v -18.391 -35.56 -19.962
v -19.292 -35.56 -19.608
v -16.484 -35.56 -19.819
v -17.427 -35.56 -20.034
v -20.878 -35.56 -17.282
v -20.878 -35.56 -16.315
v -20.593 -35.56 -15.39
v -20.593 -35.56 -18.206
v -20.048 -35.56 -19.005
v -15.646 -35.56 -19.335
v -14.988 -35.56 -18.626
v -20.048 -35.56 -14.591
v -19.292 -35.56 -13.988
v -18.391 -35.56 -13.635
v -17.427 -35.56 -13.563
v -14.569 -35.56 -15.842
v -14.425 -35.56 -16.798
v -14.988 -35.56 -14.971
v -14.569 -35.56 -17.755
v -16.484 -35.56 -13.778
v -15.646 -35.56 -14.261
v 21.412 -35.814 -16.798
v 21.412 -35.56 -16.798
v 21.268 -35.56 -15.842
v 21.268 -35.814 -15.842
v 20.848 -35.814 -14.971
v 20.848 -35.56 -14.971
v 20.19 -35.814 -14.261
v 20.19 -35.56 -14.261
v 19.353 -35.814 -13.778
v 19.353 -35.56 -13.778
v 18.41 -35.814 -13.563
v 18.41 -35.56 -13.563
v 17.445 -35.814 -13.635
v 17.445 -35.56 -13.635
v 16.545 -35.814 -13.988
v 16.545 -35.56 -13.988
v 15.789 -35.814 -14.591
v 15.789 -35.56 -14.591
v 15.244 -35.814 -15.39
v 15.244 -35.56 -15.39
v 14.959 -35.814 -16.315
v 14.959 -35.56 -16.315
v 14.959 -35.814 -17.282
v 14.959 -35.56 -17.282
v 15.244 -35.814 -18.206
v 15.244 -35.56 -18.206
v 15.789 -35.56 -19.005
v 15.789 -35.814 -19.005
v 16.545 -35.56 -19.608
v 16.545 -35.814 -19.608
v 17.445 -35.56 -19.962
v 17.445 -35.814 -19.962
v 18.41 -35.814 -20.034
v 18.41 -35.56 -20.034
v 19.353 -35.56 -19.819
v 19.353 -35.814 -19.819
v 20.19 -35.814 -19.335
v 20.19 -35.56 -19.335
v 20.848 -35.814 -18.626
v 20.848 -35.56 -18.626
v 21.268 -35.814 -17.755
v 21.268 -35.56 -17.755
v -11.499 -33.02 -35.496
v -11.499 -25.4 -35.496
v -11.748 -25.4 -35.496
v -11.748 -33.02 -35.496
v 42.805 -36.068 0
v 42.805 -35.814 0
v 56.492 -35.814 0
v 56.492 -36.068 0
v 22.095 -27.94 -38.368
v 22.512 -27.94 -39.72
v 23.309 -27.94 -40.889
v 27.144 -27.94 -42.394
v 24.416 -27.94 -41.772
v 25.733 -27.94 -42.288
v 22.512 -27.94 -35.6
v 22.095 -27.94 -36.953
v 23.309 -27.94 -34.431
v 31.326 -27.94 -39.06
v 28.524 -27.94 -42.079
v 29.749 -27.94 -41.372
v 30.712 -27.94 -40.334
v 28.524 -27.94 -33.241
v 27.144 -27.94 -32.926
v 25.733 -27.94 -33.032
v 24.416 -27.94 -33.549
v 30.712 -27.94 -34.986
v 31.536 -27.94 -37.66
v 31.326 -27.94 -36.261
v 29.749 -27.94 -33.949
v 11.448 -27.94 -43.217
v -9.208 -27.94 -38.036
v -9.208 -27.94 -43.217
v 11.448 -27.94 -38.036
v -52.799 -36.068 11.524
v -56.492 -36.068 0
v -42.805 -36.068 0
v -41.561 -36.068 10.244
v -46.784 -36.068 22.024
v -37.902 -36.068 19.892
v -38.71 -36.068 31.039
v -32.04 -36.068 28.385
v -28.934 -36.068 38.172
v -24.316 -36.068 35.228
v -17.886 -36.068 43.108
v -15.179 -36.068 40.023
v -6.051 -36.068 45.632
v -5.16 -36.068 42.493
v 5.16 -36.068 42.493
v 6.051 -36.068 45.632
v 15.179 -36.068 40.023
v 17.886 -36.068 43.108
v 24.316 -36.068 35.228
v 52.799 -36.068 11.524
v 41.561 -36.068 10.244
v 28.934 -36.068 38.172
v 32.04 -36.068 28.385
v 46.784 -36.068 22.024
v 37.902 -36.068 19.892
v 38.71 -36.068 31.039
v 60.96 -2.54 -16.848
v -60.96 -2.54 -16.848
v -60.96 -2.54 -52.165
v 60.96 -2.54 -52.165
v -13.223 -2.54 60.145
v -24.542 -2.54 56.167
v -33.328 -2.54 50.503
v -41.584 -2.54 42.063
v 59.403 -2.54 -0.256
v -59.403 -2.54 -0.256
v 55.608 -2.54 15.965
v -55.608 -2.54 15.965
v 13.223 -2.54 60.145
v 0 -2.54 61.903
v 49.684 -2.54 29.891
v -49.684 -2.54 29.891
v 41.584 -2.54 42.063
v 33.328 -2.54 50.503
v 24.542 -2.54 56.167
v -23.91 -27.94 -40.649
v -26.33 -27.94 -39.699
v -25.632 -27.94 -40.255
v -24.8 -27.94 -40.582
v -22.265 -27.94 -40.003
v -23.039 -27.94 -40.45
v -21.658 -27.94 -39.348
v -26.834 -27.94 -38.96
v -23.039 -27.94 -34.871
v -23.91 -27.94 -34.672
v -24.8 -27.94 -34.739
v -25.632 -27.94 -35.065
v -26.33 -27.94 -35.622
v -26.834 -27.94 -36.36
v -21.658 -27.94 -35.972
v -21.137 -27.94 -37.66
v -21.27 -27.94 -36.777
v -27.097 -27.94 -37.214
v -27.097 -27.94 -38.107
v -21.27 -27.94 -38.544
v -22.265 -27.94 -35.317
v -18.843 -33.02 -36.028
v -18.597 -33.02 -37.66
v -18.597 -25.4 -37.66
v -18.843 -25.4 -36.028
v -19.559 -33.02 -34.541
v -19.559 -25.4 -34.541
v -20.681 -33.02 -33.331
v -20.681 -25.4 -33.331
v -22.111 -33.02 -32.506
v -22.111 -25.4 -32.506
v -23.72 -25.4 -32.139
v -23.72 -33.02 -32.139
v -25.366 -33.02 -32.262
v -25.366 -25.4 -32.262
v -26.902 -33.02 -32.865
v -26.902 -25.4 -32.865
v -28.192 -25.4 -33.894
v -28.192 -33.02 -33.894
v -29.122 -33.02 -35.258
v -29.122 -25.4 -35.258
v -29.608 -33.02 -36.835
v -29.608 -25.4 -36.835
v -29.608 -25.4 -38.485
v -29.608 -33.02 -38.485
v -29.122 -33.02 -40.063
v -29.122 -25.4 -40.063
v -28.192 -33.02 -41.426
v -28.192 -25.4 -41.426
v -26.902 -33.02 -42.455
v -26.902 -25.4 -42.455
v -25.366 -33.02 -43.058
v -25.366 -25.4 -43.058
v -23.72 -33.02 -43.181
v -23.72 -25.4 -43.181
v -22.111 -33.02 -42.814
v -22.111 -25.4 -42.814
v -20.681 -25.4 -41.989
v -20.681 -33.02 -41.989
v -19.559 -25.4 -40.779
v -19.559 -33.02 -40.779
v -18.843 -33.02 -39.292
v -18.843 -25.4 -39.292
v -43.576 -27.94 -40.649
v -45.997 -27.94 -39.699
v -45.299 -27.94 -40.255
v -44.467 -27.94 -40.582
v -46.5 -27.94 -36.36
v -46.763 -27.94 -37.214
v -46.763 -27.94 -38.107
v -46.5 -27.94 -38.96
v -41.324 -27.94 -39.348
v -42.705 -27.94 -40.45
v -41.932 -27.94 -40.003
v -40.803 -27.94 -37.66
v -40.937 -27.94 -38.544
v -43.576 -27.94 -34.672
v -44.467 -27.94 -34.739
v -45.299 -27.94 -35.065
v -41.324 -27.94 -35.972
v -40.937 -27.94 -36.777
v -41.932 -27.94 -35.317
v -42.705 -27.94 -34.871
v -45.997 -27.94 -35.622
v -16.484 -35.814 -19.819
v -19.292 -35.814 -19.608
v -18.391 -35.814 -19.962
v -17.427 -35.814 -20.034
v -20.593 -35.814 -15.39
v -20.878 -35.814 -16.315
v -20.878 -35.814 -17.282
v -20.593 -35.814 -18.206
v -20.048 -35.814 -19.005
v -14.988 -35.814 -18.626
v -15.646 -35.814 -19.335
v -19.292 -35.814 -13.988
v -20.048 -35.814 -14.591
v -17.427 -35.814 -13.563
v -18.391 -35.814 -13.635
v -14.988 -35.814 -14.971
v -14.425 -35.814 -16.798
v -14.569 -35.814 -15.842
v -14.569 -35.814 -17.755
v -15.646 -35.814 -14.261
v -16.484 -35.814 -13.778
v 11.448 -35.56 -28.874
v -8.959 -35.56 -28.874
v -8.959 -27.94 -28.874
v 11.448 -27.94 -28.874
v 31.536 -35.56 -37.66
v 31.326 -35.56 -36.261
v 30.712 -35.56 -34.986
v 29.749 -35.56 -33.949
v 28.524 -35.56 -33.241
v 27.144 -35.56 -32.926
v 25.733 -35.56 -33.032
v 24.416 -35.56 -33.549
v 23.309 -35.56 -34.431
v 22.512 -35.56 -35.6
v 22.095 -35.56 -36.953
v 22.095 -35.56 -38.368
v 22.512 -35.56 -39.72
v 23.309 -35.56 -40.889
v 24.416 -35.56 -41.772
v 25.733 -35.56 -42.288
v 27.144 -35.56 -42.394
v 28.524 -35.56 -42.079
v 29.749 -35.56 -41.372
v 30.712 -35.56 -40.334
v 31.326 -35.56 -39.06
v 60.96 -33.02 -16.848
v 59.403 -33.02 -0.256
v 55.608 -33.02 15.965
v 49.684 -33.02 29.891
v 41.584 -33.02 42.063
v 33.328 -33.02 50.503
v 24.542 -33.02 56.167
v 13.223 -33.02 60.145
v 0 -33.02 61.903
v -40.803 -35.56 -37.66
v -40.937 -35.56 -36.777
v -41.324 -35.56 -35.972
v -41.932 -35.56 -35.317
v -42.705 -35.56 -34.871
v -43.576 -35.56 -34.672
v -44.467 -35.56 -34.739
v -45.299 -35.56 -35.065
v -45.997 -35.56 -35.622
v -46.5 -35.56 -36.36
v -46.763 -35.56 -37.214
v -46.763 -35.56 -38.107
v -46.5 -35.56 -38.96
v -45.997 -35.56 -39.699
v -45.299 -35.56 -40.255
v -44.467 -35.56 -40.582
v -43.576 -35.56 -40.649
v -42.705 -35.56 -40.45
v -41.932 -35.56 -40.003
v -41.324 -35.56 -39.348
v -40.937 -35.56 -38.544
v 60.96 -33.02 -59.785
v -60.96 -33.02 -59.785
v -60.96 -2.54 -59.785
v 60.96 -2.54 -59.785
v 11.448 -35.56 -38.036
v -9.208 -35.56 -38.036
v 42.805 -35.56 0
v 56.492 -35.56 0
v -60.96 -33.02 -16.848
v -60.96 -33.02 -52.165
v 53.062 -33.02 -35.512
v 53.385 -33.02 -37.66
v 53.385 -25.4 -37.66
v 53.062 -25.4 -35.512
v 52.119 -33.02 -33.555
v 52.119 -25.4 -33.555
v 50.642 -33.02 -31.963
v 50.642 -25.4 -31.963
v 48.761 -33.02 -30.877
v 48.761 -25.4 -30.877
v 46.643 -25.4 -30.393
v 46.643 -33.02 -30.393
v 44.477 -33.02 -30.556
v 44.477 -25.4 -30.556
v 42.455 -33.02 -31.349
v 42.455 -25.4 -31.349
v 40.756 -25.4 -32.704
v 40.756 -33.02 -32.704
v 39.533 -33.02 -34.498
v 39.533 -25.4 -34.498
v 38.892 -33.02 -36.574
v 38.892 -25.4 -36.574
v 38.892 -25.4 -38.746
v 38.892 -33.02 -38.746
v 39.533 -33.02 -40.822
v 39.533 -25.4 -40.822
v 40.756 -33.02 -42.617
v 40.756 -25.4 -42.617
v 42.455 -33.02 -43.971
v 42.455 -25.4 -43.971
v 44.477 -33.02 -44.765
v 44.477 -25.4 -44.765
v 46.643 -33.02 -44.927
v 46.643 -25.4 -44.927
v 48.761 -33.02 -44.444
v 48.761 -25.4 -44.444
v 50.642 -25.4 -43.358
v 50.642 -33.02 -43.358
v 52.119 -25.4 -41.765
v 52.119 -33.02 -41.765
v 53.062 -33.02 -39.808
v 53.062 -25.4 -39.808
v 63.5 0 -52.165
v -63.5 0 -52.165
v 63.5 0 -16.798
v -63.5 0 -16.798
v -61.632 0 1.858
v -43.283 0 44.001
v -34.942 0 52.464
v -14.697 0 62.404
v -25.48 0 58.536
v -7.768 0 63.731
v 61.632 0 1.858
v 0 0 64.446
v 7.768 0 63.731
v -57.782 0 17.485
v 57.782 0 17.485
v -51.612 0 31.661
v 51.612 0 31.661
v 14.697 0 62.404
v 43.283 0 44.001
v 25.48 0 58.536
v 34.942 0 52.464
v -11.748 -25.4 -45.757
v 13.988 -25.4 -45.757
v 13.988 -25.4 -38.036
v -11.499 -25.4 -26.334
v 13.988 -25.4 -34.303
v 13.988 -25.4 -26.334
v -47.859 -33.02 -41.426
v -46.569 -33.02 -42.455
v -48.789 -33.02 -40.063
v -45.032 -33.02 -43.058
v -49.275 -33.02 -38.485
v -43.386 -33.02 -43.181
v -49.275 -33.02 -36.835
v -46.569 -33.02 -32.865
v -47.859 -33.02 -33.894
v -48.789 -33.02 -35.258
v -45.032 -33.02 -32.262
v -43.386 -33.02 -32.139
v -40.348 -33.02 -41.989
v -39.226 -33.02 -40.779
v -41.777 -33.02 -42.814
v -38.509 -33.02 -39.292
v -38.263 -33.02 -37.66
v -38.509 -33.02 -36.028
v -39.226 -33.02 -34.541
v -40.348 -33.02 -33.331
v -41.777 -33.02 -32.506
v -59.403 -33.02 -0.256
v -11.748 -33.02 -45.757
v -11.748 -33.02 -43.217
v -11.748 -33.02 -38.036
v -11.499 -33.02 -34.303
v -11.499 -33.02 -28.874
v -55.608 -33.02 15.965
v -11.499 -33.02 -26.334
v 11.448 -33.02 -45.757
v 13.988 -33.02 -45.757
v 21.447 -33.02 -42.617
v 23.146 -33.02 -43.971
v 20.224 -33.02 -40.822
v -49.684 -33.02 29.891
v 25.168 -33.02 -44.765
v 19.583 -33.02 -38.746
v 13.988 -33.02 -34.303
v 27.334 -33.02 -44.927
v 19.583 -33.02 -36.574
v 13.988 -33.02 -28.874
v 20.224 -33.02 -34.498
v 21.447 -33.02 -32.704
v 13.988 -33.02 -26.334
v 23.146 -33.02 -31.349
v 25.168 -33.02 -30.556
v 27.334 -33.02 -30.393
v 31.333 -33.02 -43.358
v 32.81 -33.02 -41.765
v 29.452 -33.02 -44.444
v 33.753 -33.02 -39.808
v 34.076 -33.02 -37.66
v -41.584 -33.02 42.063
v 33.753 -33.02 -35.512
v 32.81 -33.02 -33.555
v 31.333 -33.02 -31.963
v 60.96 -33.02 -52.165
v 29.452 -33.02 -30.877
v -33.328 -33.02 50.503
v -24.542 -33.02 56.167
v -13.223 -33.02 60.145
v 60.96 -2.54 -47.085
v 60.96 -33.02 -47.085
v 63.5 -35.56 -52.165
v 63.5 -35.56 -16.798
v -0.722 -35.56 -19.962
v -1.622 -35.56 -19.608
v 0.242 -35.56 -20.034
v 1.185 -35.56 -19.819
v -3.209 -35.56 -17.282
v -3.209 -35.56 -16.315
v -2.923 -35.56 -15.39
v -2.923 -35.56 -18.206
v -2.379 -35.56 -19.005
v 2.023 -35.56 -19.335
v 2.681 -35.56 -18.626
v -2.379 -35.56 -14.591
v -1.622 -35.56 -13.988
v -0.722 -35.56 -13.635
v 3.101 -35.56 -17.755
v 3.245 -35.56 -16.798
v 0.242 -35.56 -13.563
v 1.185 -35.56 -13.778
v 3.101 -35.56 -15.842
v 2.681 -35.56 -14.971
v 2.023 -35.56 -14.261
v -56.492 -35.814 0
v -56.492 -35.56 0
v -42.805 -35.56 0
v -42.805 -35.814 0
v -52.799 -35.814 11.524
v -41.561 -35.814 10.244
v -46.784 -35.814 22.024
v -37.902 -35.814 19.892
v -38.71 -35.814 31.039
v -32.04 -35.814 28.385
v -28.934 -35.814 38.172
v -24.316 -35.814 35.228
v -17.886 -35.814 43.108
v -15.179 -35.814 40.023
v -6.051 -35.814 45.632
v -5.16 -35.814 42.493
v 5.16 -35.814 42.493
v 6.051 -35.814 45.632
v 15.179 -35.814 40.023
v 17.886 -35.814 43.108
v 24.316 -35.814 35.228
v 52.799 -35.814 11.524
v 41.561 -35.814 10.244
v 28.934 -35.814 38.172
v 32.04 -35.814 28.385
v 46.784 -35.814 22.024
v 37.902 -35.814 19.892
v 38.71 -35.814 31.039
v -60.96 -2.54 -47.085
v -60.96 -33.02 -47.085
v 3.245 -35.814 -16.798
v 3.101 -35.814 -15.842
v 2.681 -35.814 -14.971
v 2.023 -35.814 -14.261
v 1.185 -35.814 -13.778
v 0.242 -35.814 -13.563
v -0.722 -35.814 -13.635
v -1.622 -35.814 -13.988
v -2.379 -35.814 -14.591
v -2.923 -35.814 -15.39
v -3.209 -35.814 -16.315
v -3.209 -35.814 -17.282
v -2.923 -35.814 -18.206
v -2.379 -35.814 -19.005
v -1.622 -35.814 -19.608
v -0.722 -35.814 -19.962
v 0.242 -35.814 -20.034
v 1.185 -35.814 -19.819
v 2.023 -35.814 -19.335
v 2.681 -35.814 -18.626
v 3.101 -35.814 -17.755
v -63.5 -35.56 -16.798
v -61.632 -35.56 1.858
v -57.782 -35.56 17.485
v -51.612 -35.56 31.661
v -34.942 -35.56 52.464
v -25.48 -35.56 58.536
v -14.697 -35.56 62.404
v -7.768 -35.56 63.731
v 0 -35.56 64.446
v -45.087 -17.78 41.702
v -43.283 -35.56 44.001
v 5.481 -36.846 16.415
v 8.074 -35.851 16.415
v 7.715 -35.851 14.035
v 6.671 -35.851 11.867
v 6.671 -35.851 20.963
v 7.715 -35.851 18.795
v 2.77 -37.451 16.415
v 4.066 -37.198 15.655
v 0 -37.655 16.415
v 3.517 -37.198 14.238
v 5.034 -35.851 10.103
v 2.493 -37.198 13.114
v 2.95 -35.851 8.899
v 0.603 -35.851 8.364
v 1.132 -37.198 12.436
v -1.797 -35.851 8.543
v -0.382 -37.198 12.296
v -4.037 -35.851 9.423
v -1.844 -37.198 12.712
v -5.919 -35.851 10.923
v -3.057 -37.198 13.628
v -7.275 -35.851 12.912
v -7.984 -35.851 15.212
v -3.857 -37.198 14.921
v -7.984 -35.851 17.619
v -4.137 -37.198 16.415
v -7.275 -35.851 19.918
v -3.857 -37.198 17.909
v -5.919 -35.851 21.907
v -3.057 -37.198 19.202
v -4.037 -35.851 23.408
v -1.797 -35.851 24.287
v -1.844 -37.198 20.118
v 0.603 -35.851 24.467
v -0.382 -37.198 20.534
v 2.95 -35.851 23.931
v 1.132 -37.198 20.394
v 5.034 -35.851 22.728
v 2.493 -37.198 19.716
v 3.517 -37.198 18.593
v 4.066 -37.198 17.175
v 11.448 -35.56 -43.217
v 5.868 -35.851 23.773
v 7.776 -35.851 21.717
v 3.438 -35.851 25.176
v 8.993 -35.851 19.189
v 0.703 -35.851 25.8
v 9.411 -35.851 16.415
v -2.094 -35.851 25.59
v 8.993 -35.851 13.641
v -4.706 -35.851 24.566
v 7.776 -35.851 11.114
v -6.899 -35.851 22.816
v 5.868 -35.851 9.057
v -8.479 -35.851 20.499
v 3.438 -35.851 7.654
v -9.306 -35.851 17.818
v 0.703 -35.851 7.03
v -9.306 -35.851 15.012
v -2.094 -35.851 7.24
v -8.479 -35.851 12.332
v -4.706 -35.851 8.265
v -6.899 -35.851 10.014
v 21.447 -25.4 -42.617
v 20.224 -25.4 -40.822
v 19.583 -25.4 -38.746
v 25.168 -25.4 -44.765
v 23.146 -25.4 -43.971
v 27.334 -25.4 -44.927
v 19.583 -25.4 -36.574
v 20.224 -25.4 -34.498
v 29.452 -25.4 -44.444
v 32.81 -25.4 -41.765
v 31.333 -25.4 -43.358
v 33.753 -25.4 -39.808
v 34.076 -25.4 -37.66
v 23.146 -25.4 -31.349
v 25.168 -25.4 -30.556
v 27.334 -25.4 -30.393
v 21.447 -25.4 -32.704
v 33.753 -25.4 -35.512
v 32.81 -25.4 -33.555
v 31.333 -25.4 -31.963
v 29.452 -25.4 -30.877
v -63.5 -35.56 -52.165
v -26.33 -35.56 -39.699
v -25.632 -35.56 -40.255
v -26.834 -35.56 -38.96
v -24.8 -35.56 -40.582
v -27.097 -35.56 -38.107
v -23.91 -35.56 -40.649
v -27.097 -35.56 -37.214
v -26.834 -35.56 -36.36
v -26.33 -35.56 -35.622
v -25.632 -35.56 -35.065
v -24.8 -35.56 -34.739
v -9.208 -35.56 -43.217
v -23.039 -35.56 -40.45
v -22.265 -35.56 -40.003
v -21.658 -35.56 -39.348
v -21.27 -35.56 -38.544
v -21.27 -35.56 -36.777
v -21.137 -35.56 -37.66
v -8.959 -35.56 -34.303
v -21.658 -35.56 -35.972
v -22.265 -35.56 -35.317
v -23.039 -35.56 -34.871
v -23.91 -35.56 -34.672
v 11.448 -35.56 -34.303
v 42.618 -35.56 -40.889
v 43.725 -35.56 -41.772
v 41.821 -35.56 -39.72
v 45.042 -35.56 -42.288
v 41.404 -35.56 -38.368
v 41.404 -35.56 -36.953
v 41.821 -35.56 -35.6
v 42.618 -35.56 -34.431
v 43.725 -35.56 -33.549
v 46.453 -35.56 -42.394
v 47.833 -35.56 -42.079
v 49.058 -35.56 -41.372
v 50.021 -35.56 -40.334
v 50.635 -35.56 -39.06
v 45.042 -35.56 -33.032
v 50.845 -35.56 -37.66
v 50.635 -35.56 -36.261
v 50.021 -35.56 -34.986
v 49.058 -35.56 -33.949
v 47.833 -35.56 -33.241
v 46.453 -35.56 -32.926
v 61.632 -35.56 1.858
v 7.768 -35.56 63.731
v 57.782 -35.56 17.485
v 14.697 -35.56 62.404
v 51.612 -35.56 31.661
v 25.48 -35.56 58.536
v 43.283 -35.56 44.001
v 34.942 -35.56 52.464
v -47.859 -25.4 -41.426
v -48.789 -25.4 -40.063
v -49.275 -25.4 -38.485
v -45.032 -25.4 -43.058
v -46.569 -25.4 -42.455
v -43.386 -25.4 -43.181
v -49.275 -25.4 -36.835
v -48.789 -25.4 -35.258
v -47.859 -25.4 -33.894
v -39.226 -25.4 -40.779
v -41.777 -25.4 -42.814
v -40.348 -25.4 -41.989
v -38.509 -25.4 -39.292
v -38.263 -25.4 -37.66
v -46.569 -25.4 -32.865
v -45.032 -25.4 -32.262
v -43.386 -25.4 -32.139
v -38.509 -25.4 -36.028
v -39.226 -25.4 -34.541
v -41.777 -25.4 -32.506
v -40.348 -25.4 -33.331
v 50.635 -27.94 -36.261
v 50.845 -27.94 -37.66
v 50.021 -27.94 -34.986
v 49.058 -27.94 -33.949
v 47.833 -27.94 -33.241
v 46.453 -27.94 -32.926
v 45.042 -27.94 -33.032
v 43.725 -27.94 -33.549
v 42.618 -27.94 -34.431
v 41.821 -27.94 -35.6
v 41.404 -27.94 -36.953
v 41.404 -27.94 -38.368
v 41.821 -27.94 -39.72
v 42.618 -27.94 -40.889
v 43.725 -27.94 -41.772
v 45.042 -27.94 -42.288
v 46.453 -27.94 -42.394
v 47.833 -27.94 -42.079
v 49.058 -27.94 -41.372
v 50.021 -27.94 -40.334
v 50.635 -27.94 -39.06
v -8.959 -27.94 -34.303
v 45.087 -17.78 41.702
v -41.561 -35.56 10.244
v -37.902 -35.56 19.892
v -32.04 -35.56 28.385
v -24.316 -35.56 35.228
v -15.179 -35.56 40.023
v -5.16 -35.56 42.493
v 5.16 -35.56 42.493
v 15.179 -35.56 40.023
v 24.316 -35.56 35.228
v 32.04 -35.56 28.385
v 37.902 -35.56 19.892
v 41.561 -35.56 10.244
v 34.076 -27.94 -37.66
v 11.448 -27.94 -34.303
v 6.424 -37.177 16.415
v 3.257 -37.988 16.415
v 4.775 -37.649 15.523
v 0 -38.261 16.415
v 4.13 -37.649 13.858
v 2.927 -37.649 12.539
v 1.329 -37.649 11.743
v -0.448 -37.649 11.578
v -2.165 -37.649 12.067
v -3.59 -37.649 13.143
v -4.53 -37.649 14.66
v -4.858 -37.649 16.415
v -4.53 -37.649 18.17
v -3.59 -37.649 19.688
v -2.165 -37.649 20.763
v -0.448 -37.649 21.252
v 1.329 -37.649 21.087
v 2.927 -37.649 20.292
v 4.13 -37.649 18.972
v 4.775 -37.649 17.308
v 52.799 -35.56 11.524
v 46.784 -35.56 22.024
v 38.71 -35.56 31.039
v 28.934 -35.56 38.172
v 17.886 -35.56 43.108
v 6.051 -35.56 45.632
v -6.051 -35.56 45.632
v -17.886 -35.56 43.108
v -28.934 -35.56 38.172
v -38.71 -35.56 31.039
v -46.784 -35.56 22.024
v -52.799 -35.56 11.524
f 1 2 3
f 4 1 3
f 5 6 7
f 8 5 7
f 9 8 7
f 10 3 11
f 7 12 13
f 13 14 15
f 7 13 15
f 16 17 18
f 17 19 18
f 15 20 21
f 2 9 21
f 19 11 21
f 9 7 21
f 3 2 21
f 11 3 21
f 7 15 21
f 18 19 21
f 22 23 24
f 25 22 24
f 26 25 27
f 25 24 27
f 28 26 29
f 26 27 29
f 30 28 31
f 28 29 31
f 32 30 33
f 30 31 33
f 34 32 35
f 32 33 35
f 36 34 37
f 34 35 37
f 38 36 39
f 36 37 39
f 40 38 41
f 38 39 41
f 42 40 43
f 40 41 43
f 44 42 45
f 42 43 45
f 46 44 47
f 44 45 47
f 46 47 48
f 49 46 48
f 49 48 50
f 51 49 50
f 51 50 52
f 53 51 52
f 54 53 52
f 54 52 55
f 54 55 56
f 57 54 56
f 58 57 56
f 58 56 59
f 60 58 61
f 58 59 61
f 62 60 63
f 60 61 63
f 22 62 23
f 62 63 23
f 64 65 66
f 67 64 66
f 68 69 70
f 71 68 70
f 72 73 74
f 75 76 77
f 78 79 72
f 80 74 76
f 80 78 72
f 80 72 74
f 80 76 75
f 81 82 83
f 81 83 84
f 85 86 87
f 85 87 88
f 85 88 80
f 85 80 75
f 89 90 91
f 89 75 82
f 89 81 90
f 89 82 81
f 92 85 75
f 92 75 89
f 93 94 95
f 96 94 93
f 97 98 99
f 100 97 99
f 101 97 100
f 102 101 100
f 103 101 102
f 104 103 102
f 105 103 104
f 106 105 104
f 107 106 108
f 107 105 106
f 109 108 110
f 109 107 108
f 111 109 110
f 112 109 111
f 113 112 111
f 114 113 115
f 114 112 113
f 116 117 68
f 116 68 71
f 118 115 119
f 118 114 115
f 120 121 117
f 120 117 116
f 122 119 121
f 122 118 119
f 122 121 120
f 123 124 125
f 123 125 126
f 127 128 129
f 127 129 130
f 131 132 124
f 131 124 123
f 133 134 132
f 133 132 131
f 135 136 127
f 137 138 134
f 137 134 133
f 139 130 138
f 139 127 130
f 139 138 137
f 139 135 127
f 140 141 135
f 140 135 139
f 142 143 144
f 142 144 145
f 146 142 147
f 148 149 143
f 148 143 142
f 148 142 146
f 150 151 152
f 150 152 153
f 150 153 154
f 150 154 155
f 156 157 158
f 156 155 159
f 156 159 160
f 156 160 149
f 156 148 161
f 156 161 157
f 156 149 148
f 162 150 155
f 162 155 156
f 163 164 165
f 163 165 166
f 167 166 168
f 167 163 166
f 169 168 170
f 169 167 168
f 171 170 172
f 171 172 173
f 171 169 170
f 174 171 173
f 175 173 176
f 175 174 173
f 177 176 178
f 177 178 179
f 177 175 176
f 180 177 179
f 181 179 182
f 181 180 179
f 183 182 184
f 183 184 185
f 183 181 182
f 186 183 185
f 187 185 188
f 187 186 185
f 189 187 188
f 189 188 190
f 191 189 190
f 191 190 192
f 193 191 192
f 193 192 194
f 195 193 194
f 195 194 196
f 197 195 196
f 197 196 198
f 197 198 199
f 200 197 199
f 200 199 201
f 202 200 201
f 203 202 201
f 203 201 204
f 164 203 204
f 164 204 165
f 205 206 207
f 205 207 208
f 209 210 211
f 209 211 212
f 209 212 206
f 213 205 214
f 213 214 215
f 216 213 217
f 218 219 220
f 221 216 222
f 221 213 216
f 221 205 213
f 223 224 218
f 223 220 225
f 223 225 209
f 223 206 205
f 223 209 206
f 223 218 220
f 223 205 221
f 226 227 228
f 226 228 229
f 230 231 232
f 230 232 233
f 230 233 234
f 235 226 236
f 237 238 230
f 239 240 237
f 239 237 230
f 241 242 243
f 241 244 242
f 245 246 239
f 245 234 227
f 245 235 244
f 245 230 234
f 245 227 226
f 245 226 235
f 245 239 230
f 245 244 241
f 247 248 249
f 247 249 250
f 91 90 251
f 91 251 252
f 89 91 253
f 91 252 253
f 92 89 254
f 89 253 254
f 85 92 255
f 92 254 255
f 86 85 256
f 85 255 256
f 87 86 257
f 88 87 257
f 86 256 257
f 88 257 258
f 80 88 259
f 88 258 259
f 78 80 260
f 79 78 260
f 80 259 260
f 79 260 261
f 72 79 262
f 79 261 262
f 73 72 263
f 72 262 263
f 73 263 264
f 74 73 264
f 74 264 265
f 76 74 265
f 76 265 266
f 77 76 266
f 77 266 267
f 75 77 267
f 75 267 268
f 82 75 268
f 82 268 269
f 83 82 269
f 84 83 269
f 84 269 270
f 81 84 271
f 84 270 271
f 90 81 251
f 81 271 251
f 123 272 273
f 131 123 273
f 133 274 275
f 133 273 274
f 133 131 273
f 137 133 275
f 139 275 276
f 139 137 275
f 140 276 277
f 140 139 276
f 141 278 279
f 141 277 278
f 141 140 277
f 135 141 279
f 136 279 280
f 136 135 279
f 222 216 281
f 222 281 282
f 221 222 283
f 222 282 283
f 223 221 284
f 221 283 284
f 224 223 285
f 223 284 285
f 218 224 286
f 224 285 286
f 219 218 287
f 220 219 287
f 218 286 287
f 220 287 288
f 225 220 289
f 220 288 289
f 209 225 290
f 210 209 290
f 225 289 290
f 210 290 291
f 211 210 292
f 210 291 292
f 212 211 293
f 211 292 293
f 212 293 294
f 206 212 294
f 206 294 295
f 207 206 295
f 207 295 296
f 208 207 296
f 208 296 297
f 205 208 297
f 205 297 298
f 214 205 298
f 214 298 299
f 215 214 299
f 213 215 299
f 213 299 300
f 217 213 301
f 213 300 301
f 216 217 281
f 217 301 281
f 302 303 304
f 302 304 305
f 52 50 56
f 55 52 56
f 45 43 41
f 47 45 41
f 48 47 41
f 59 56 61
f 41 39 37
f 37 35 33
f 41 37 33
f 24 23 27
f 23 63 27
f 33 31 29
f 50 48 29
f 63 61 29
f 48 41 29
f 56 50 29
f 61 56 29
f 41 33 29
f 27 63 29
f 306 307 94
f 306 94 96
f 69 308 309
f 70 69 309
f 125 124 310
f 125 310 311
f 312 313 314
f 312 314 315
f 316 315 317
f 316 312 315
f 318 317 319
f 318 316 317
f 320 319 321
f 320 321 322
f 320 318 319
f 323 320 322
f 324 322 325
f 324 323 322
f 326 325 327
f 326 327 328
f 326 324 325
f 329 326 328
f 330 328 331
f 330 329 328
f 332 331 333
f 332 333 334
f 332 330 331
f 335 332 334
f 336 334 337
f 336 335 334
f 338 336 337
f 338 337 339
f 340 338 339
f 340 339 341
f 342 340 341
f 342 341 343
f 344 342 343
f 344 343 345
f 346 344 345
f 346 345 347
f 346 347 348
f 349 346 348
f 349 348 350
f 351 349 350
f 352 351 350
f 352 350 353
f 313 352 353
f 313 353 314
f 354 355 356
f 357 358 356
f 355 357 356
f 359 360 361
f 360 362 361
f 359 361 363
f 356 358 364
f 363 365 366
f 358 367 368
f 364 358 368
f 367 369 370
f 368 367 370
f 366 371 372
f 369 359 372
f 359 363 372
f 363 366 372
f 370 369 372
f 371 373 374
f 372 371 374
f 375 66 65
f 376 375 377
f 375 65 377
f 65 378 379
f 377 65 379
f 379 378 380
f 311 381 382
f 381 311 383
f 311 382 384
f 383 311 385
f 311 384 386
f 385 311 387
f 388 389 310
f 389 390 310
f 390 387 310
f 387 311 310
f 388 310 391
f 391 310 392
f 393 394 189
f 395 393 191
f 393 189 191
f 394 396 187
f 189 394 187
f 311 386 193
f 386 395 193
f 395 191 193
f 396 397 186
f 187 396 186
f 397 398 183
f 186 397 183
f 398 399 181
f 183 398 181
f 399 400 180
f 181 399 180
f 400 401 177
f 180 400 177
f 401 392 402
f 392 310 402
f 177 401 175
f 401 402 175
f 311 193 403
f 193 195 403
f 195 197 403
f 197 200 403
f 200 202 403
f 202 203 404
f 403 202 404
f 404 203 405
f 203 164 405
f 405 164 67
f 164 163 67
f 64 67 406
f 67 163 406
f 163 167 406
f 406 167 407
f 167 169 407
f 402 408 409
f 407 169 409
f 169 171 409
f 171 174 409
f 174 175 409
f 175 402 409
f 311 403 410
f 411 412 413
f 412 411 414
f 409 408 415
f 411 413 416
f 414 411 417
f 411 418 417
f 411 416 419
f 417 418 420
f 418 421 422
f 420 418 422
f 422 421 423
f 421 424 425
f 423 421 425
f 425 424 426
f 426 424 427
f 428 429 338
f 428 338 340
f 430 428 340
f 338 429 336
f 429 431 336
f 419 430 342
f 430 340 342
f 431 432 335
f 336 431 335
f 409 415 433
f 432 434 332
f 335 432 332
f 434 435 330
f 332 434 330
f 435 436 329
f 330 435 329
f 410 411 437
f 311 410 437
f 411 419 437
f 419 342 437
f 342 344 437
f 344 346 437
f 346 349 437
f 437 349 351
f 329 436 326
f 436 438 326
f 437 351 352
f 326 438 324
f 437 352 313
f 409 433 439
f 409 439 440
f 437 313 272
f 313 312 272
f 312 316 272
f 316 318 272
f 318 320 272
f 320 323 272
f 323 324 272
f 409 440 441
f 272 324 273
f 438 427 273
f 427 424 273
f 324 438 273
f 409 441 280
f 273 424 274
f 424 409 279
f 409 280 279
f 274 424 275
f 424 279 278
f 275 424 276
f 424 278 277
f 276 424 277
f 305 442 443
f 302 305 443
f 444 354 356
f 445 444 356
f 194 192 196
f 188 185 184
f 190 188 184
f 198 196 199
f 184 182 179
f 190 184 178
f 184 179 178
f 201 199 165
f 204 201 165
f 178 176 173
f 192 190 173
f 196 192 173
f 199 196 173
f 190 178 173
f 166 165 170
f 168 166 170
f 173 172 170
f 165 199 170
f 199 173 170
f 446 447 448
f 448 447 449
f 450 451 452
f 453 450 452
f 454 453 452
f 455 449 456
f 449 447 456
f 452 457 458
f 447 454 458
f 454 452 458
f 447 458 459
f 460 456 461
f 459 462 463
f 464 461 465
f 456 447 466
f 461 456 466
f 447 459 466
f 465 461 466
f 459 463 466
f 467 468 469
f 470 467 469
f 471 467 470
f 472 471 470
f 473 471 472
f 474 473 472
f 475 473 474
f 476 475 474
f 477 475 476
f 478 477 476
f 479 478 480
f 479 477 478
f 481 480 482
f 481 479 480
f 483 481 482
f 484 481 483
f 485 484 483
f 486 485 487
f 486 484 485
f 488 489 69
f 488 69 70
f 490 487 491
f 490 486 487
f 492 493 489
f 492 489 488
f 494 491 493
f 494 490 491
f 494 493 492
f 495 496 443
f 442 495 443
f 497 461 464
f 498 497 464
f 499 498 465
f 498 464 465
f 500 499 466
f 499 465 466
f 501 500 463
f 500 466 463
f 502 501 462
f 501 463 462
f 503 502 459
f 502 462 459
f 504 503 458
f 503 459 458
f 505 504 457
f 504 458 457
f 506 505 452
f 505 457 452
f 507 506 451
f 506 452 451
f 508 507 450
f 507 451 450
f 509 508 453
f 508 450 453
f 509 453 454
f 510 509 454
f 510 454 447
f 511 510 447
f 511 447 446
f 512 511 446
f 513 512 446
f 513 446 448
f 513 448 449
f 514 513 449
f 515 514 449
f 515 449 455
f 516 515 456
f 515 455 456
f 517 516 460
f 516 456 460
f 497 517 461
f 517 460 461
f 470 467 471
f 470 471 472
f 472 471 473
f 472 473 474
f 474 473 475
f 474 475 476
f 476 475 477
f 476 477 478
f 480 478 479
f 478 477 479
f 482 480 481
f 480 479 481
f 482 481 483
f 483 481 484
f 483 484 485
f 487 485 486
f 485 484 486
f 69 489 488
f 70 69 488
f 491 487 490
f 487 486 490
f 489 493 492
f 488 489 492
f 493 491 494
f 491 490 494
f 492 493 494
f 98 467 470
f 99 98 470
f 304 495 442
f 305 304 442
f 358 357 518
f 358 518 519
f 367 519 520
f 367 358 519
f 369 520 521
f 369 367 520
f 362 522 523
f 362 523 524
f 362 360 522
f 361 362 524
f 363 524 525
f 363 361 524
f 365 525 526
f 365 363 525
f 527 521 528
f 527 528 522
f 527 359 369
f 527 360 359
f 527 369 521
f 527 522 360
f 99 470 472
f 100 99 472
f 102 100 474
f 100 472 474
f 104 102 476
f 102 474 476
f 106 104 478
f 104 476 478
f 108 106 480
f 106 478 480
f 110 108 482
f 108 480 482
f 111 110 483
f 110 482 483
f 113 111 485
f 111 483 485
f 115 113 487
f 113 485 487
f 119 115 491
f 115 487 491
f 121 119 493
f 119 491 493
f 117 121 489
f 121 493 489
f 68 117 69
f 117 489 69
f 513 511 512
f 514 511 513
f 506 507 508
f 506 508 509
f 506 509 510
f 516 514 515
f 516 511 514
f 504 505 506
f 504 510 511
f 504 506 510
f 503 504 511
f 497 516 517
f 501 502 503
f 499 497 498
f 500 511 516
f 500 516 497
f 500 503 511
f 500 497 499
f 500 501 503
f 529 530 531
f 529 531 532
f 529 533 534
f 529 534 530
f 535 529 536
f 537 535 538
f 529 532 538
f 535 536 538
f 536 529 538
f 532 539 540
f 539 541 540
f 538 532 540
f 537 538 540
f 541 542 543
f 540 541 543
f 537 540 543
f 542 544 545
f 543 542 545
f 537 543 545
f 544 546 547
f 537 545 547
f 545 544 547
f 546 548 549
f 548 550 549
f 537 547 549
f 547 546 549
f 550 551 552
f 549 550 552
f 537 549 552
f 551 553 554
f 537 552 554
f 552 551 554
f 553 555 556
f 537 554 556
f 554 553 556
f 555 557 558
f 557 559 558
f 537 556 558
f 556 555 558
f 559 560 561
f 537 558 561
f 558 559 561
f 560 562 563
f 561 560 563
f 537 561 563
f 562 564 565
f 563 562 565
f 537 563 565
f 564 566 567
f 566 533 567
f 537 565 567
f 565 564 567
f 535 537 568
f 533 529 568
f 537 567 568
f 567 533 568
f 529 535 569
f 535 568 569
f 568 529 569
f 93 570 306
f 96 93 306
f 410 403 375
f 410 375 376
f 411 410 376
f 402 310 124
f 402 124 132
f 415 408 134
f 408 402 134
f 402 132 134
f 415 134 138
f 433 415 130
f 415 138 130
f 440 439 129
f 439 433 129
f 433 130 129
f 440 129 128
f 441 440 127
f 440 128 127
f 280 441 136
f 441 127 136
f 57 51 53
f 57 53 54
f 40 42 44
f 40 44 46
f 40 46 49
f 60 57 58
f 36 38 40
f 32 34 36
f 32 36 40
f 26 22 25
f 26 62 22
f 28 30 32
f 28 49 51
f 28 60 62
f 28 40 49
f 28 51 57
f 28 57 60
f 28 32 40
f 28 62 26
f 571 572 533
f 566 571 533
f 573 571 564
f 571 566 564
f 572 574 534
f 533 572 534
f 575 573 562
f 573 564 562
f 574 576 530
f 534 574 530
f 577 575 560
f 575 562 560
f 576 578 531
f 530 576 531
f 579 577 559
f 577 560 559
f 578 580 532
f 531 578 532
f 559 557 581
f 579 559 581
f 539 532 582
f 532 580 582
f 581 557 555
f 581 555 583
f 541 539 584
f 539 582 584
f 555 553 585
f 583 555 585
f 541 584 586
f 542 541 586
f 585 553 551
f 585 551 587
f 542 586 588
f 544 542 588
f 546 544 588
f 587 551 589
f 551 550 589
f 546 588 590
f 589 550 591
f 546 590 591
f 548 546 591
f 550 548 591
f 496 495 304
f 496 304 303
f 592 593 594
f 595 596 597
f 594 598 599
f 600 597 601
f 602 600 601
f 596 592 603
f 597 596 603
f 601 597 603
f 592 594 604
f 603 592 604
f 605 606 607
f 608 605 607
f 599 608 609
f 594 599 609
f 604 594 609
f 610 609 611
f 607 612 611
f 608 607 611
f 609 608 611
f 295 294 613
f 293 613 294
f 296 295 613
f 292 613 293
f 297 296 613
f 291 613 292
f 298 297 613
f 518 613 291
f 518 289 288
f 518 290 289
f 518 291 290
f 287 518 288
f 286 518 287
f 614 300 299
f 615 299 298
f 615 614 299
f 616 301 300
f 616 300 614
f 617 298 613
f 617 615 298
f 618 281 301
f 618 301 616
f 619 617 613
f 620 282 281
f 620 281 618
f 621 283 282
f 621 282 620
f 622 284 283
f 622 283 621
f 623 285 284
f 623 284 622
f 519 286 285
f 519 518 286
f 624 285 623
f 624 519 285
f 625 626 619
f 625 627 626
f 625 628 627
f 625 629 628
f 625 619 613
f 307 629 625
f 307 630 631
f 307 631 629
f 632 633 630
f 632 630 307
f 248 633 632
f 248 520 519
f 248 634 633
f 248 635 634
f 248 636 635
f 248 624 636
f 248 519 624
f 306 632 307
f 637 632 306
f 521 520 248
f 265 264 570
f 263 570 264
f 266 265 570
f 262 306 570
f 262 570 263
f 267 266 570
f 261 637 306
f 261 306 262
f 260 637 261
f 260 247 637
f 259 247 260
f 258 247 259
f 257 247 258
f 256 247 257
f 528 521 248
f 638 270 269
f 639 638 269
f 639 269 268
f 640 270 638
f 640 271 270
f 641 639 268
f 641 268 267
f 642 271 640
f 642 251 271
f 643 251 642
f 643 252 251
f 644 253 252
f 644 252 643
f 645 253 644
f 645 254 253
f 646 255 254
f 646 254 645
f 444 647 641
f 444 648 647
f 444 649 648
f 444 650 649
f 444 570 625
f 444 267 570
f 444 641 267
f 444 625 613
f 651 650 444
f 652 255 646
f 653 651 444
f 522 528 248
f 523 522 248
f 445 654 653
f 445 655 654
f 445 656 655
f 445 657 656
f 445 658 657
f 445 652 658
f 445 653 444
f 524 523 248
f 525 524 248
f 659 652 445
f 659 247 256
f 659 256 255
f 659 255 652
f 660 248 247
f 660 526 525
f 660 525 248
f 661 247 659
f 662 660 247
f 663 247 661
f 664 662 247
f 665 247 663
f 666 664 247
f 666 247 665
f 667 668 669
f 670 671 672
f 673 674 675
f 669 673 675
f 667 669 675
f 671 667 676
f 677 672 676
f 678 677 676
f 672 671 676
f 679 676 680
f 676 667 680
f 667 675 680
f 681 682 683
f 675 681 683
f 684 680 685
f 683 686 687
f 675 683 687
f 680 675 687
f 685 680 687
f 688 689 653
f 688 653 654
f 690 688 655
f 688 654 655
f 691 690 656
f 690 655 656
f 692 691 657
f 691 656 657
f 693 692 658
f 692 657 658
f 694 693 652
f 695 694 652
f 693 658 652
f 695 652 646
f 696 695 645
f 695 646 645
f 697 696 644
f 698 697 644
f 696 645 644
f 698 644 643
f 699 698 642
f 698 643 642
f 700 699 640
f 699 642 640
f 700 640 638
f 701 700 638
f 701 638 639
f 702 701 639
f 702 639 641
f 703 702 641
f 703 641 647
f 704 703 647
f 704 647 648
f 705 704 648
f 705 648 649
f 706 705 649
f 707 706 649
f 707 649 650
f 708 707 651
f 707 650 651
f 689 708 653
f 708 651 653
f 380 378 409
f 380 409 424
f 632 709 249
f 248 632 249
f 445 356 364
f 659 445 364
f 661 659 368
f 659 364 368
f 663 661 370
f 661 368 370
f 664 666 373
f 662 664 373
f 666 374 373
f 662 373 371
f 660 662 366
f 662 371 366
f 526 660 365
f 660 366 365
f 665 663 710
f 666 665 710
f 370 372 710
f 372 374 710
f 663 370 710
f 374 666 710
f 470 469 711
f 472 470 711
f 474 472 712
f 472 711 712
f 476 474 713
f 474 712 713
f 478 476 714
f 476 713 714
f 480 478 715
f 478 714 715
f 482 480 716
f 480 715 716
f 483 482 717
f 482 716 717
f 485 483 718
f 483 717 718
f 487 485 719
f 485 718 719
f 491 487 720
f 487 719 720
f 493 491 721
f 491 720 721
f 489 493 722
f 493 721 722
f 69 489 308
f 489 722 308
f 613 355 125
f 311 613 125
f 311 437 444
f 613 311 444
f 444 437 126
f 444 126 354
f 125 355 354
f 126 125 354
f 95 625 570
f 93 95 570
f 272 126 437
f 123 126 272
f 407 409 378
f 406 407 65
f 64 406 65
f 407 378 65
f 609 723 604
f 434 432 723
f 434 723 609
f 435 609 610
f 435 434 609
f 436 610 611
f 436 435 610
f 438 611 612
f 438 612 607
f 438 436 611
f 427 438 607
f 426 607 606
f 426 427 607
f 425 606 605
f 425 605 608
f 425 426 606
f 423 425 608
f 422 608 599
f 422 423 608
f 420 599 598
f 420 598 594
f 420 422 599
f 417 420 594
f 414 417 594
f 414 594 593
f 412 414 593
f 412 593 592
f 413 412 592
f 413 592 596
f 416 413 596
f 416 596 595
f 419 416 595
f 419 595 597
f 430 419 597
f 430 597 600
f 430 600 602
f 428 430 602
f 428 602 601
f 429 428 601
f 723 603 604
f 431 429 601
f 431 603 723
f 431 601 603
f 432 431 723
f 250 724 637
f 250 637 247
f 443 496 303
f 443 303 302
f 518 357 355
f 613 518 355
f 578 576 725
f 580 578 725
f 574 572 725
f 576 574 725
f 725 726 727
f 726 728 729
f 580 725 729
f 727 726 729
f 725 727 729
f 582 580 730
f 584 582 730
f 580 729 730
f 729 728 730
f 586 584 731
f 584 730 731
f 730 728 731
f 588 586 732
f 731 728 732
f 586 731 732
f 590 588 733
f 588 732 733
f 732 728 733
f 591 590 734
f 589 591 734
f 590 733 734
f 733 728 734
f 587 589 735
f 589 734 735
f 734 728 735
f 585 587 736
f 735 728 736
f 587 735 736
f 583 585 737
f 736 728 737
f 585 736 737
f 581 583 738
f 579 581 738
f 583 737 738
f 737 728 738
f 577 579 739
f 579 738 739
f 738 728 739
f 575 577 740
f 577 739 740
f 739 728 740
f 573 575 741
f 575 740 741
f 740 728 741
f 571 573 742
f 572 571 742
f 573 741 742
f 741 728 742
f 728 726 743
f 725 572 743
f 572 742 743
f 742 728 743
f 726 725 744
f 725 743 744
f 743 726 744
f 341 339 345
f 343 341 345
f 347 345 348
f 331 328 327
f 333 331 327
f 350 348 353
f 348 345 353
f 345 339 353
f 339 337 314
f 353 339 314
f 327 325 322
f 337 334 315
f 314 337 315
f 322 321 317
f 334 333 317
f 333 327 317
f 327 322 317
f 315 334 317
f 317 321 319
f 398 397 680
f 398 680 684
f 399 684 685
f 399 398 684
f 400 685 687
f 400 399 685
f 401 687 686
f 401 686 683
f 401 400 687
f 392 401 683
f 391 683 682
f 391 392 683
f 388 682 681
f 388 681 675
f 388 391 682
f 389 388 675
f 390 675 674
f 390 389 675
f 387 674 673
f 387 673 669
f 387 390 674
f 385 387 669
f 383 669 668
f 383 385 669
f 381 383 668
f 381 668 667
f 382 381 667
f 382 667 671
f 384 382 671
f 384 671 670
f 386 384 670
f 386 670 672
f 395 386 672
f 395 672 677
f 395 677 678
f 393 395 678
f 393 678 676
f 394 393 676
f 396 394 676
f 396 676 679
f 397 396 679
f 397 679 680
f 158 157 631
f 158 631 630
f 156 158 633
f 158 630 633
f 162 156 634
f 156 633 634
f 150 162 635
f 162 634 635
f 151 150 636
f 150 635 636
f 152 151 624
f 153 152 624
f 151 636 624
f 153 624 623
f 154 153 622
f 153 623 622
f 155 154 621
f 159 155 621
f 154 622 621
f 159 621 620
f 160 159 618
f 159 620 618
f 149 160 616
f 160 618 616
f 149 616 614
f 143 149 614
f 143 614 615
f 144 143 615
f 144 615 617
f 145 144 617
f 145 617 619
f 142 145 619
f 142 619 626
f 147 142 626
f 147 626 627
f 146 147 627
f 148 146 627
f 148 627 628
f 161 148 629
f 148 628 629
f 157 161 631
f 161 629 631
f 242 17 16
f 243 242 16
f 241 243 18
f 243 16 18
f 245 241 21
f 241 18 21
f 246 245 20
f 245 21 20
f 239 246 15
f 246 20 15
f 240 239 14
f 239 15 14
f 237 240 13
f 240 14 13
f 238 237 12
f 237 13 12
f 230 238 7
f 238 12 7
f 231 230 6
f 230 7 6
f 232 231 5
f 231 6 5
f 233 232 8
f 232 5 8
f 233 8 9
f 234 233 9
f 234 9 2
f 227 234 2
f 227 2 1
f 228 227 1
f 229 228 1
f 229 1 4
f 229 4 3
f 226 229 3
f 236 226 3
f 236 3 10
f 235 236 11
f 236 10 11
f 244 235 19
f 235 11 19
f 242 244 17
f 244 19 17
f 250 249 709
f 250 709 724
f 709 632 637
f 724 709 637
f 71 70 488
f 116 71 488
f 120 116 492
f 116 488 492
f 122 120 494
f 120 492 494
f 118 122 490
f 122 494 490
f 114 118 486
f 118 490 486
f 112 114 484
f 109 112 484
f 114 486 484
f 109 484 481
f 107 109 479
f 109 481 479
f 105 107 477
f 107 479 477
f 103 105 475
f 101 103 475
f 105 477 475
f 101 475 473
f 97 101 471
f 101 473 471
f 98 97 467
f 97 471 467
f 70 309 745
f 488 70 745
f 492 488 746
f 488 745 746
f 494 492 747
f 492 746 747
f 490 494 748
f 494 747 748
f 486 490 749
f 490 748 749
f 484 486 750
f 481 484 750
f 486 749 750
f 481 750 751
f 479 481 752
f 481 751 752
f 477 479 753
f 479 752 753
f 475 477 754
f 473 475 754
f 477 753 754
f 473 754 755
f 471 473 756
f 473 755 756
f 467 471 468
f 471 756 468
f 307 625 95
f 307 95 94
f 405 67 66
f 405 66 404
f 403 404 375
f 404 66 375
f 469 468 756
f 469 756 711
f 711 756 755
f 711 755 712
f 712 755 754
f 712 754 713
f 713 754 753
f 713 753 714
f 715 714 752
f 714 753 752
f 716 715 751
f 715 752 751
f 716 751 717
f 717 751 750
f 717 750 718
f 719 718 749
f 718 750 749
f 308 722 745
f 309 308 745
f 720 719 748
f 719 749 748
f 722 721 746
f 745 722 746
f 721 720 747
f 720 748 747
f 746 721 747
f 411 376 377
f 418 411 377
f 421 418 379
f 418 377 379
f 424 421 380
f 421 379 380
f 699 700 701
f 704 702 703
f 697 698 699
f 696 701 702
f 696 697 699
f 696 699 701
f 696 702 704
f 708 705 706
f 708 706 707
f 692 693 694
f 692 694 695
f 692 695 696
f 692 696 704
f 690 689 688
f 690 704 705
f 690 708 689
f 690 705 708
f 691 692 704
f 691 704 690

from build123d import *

# Parameters (mm, degrees)
F1_DEPTH     = 35.56
F2_W         = 20.4069074243
F2_H         = 5.429463461
F2_W_2       = 20.6557726488
F2_H_2       = 5.1806047559
F2_R         = 4.7472786305
F2_R_2       = 2.9967281819
F3_DEPTH     = 7.62
F5_DEPTH     = 0.254
F4_R         = 3.2448006106
F6_DEPTH     = 0.254
F7_T         = 2.54
F7_T3_DEPTH  = 12.7
F7_T5_DEPTH  = 25.7357726488
F7_T7_DEPTH  = 10.2606047559
F7_T9_DEPTH  = 25.4869074243
F7_T11_DEPTH = 10.509463461
F9_W         = 121.92
F9_H         = 30.48
F10_DEPTH    = 12.7


# Not quite as in the source:
# - a shell that OpenCascade refuses in one call is made with other operations: the cavity is built on its own and cut out


with BuildPart() as f1:
    # F0 (on Front) → F1 (new body)
    with BuildSketch(Plane.XZ):
        with BuildLine():
            Line((-63.5, -52.164846403), (0, -52.164846403))
            Line((0, -52.164846403), (63.5, -52.164846403))
            Line((63.5, -52.164846403), (63.5, -16.7983658612))
            add(Edge.make_bspline(
                [(63.5, -16.7983658612), (62.4360478279, 10.32030946), (49.129273617, 44.0268624364), (23.4670229256, 63.3222609758), (0, 64.4457638264)],
                knots=[0, 0, 0, 0, 0.5242691479, 1, 1, 1, 1], degree=3))
            add(Edge.make_bspline(
                [(-63.5, -16.7983658612), (-62.4360478279, 10.32030946), (-49.129273617, 44.0268624364), (-23.4670229256, 63.3222609758), (0, 64.4457638264)],
                knots=[0, 0, 0, 0, 0.5242691479, 1, 1, 1, 1], degree=3))
            Line((-63.5, -16.7983658612), (-63.5, -52.164846403))
        make_face()
    extrude(amount=F1_DEPTH)

    # F2 (on face) → F3 (cut)
    with BuildSketch(Plane.XZ.offset(35.56)):
        with Locations((1.2443242595, -31.5884416923)):
            Rectangle(F2_W, F2_H)
        with Locations((1.1198916472, -40.6264439225)):
            Rectangle(F2_W_2, F2_H_2)
        with Locations((26.7892014235, -37.6602374017)):
            Circle(F2_R)
        with Locations((46.0982057871, -37.6602374017)):
            Circle(F2_R)
        with Locations((-24.1335762036, -37.6602374017)):
            Circle(F2_R_2)
        with Locations((-43.8001863658, -37.6602374017)):
            Circle(F2_R_2)
    extrude(amount=-F3_DEPTH, mode=Mode.SUBTRACT)

    # F7: shell of thickness 2.54, made by hand


with BuildPart() as f5:
    # F4 (on face) → F5 (new body)
    with BuildSketch(Plane.XZ.offset(35.56)):
        with BuildLine():
            Line((-56.4922876656, 0), (-42.8047291934, 0))
            ThreePointArc((-42.8047291934, 0), (0, 42.8047291934), (42.8047291934, 0))
            Line((42.8047291934, 0), (56.4922876656, 0))
            ThreePointArc((56.4922876656, 0), (0, 45.95054916), (-56.4922876656, 0))
        make_face()
    extrude(amount=F5_DEPTH)


with BuildPart() as f5b:
    # F4 (on face) → F5, piece 2 (new body)
    with BuildSketch(Plane.XZ.offset(35.56)):
        with Locations((-17.6693946123, -16.7983658612)):
            Circle(F4_R)
    extrude(amount=F5_DEPTH)


with BuildPart() as f5c:
    # F4 (on face) → F5, piece 3 (new body)
    with BuildSketch(Plane.XZ.offset(35.56)):
        with Locations((0, -16.7983658612)):
            Circle(F4_R)
    extrude(amount=F5_DEPTH)


with BuildPart() as f5d:
    # F4 (on face) → F5, piece 4 (new body)
    with BuildSketch(Plane.XZ.offset(35.56)):
        with Locations((18.1671231985, -16.7983658612)):
            Circle(F4_R)
    extrude(amount=F5_DEPTH)


with BuildPart() as f6:
    # F6 (new): a face of the model
    f6_faces = [f5.part.faces().sort_by_distance(p)[0] for p in [
        (-49.6485084295, -35.814, 1.2197117377),
    ]]
    extrude(f6_faces, amount=F6_DEPTH)


with BuildPart() as f7_core1:
    # F7_t2: copy of F1
    add(f1.part)

    # the walls: a layer under each face that stays
    f7_faces = [f7_core1.faces().sort_by_distance(p)[0] for p in [
        (-63.5, -17.78, -34.4816061321),
        (0, -35.56, 6.1404587117),
        (63.5, -17.78, -34.4816061321),
        (0, 0, 6.1404587117),
        (-46.5057501218, -17.78, 39.7718854475),
        (46.5057501218, -17.78, 39.7718854475),
        (1.1198916472, -31.75, -38.0361415446),
        (-9.2079946771, -31.75, -40.6264439225),
        (1.1198916472, -31.75, -43.2167463005),
        (11.4477779716, -31.75, -40.6264439225),
        (-46.7969145477, -31.75, -37.6602374017),
        (-27.1303043855, -31.75, -37.6602374017),
        (22.041922793, -31.75, -37.6602374017),
        (41.3509271565, -31.75, -37.6602374017),
        (1.2443242595, -31.75, -28.8737099618),
        (-8.9591294527, -31.75, -31.5884416923),
        (1.2443242595, -31.75, -34.3031734228),
        (11.4477779716, -31.75, -31.5884416923),
        (1.1198916472, -27.94, -40.6264439225),
        (-43.8001863658, -27.94, -37.6602374017),
        (-24.1335762036, -27.94, -37.6602374017),
        (26.7892014235, -27.94, -37.6602374017),
        (46.0982057871, -27.94, -37.6602374017),
        (1.2443242595, -27.94, -31.5884416923),
    ]]
    thicken(f7_faces, amount=-F7_T, mode=Mode.SUBTRACT)

    # F7_s4 → F7_t3 (cut)
    with BuildSketch(Plane.XZ.offset(25.4)):
        Polygon((11.4223779716, -38.0615415446), (11.4477779716, -35.4961415446), (13.9877779716, -35.4961415446), (13.9877779716, -38.0361415446), align=None)
        Polygon((-9.1825946771, -38.0615415446), (-9.2079946771, -35.4961415446), (-11.7479946771, -35.4961415446), (-11.7479946771, -38.0361415446), align=None)
        Polygon((-9.1825946771, -43.1913463005), (-11.7479946771, -43.2167463005), (-11.7479946771, -45.7567463005), (-9.2079946771, -45.7567463005), align=None)
        Polygon((11.4223779716, -43.1913463005), (11.4477779716, -45.7567463005), (13.9877779716, -45.7567463005), (13.9877779716, -43.2167463005), align=None)
        Polygon((11.4223779716, -28.8991099618), (11.4477779716, -26.3337099618), (13.9877779716, -26.3337099618), (13.9877779716, -28.8737099618), align=None)
        Polygon((-8.9337294527, -28.8991099618), (-8.9591294527, -26.3337099618), (-11.4991294527, -26.3337099618), (-11.4991294527, -28.8737099618), align=None)
        Polygon((-8.9337294527, -34.2777734228), (-11.4991294527, -34.3031734228), (-11.4991294527, -36.8431734228), (-8.9591294527, -36.8431734228), align=None)
        Polygon((11.4223779716, -34.2777734228), (11.4477779716, -36.8431734228), (13.9877779716, -36.8431734228), (13.9877779716, -34.3031734228), align=None)
    extrude(amount=F7_T3_DEPTH, mode=Mode.SUBTRACT)

    # F7_s6 → F7_t5 (cut)
    with BuildSketch(Plane.YZ.offset(-11.7479946771)):
        Polygon((-27.9654, -38.0615415446), (-27.94, -35.4961415446), (-25.4, -35.4961415446), (-25.4, -38.0361415446), align=None)
        Polygon((-27.9654, -43.1913463005), (-27.94, -45.7567463005), (-25.4, -45.7567463005), (-25.4, -43.2167463005), align=None)
    extrude(amount=F7_T5_DEPTH, mode=Mode.SUBTRACT)

    # F7_s8 → F7_t7 (cut)
    with BuildSketch(Plane.XY.offset(-45.7567463005)):
        Polygon((-9.1825946771, -27.9654), (-11.7479946771, -27.94), (-11.7479946771, -25.4), (-9.2079946771, -25.4), align=None)
        Polygon((11.4223779716, -27.9654), (13.9877779716, -27.94), (13.9877779716, -25.4), (11.4477779716, -25.4), align=None)
    extrude(amount=F7_T7_DEPTH, mode=Mode.SUBTRACT)

    # F7_s10 → F7_t9 (cut)
    with BuildSketch(Plane.YZ.offset(-11.4991294527)):
        Polygon((-27.9654, -28.8991099618), (-27.94, -26.3337099618), (-25.4, -26.3337099618), (-25.4, -28.8737099618), align=None)
        Polygon((-27.9654, -34.2777734228), (-27.94, -36.8431734228), (-25.4, -36.8431734228), (-25.4, -34.3031734228), align=None)
    extrude(amount=F7_T9_DEPTH, mode=Mode.SUBTRACT)

    # F7_s12 → F7_t11 (cut)
    with BuildSketch(Plane.XY.offset(-36.8431734228)):
        Polygon((-8.9337294527, -27.9654), (-11.4991294527, -27.94), (-11.4991294527, -25.4), (-8.9591294527, -25.4), align=None)
        Polygon((11.4223779716, -27.9654), (13.9877779716, -27.94), (13.9877779716, -25.4), (11.4477779716, -25.4), align=None)
    extrude(amount=F7_T11_DEPTH, mode=Mode.SUBTRACT)

    # F7_s13 → F7_t14 (revolve, cut)
    with BuildSketch(Plane.XY.offset(-37.6602374017)):
        Polygon((-40.8288581839, -27.9654), (-38.2634581839, -27.94), (-38.2634581839, -25.4), (-40.8034581839, -25.4), align=None)
    revolve(axis=Axis((-43.8001863658, -27.94, -37.6602374017), (0, -1, 0)), mode=Mode.SUBTRACT)

    # F7_s15 → F7_t16 (revolve, cut)
    with BuildSketch(Plane.XY.offset(-37.6602374017)):
        Polygon((-21.1622480217, -27.9654), (-18.5968480217, -27.94), (-18.5968480217, -25.4), (-21.1368480217, -25.4), align=None)
    revolve(axis=Axis((-24.1335762036, -27.94, -37.6602374017), (0, -1, 0)), mode=Mode.SUBTRACT)

    # F7_s17 → F7_t18 (revolve, cut)
    with BuildSketch(Plane.XY.offset(-37.6602374017)):
        Polygon((31.5110800541, -27.9654), (34.0764800541, -27.94), (34.0764800541, -25.4), (31.5364800541, -25.4), align=None)
    revolve(axis=Axis((26.7892014235, -27.94, -37.6602374017), (0, -1, 0)), mode=Mode.SUBTRACT)

    # F7_s19 → F7_t20 (revolve, cut)
    with BuildSketch(Plane.XY.offset(-37.6602374017)):
        Polygon((50.8200844176, -27.9654), (53.3854844176, -27.94), (53.3854844176, -25.4), (50.8454844176, -25.4), align=None)
    revolve(axis=Axis((46.0982057871, -27.94, -37.6602374017), (0, -1, 0)), mode=Mode.SUBTRACT)


with BuildPart() as f1_1:
    add(f1.part)

    # what is left inside the walls is the cavity
    f7_cavity = [f7_core1.part.solids().sort_by_distance(p)[0] for p in [
        (0, -2.5654, -14.142306),
    ]]
    add(f7_cavity, mode=Mode.SUBTRACT)


with BuildPart() as f10:
    # F9 (on offset) → F10 (new body)
    with BuildSketch(Plane(origin=(0, 0, -47.084846403), x_dir=(1, 0, 0), z_dir=(0, 0, -1))):
        with Locations((0, 17.78)):
            Rectangle(F9_W, F9_H)
    extrude(amount=F10_DEPTH)


with BuildPart() as f13:
    # F12 (on offset) → F13 (revolve)
    with BuildSketch(Plane(origin=(0, 0, 16.415153597), x_dir=(1, 0, 0), z_dir=(0, 0, -1))):
        with BuildLine():
            ThreePointArc((9.4112261052, 35.8505937442), (4.8575423267, 37.6490778959), (0, 38.2613390684))
            Line((0, 38.2613390684), (0, 37.6547761261))
            ThreePointArc((0, 37.6547761261), (4.1366254111, 37.1982365786), (8.074131848, 35.8505937442))
            Line((8.074131848, 35.8505937442), (9.4112261052, 35.8505937442))
        make_face()
    revolve(axis=Axis((0, -35.8350872993, 16.415153597), (0, 1, 0)))


solid = Compound([f5.part, f5b.part, f5c.part, f5d.part, f6.part, f1_1.part, f10.part, f13.part])
